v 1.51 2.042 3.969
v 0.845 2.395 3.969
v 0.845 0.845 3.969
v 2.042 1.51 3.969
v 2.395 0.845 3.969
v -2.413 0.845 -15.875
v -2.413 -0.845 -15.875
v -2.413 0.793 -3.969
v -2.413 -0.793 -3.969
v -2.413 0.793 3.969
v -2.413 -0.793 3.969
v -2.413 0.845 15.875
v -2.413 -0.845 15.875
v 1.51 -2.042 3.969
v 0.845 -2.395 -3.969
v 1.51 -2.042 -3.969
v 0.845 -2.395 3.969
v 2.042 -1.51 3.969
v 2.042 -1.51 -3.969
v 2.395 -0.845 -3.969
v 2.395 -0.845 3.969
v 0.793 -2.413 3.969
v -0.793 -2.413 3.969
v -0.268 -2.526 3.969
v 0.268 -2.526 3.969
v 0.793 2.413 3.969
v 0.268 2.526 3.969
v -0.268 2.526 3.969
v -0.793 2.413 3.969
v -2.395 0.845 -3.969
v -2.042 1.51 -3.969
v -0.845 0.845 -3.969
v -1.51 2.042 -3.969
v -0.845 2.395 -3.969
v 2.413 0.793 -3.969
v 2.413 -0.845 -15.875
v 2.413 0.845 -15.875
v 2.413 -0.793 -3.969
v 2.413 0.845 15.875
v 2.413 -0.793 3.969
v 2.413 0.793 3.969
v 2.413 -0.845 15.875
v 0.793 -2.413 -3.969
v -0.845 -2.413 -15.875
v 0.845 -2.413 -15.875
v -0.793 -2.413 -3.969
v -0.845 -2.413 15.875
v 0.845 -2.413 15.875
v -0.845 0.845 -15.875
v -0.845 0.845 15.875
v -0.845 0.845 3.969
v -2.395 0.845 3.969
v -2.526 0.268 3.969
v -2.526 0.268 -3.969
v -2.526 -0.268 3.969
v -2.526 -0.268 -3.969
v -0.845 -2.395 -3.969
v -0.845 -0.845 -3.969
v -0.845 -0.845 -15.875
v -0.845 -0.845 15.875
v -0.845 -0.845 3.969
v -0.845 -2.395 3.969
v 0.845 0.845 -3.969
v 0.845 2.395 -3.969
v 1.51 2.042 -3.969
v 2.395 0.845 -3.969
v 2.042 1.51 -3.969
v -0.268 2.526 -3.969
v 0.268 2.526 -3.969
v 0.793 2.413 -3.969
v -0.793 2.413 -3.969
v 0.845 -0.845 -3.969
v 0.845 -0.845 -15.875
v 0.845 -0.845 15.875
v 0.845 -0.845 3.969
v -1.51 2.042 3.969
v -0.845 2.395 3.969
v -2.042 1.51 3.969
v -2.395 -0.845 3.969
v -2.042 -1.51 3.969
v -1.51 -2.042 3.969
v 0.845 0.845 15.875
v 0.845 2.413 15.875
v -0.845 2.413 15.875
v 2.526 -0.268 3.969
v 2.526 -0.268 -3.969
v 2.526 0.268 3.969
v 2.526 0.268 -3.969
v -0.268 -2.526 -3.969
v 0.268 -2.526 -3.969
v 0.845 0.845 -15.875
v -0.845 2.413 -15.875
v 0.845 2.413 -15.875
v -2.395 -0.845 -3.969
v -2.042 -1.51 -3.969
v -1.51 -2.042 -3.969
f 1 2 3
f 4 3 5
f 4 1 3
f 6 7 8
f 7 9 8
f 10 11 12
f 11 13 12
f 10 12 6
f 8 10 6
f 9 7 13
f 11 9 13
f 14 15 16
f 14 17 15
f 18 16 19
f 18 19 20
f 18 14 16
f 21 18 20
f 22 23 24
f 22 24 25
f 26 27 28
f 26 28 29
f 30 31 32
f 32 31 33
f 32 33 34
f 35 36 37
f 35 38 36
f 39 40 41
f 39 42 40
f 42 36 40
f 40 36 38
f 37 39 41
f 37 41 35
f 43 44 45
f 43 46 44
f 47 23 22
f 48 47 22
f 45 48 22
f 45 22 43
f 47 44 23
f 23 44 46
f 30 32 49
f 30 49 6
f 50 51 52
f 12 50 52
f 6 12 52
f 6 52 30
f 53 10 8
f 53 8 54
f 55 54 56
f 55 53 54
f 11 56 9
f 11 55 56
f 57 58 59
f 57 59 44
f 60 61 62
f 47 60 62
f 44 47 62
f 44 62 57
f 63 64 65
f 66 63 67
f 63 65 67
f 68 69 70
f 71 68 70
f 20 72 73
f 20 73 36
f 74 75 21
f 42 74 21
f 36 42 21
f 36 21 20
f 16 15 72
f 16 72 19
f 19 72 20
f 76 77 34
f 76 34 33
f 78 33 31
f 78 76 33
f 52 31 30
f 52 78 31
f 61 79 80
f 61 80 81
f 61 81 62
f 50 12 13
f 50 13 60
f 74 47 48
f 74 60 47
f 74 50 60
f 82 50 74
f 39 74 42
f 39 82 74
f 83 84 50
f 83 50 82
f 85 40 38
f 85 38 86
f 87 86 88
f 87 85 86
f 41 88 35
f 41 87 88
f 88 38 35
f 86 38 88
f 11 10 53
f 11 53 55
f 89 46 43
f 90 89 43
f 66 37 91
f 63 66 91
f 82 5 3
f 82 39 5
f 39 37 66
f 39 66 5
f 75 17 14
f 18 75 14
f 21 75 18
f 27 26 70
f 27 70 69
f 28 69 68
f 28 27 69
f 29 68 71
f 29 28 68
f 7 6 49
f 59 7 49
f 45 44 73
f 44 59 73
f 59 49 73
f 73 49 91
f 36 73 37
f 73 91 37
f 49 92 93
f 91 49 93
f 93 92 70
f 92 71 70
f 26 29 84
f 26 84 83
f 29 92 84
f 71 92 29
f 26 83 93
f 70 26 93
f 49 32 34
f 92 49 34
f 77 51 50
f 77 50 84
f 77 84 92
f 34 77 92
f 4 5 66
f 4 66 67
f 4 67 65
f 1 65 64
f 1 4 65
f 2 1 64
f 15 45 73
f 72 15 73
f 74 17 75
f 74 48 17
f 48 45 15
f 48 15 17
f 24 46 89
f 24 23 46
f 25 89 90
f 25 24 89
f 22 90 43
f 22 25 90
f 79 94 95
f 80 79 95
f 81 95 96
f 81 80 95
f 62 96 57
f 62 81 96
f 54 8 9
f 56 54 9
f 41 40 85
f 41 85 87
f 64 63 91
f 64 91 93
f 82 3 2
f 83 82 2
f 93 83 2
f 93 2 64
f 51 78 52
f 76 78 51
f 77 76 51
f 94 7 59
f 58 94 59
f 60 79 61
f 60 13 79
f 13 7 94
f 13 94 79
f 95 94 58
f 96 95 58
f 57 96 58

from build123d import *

# Parameters (mm, degrees)
F0_W     = 1.6891
F0_H     = 1.56845
F0_H_2   = 1.6891
F0_W_2   = 1.56845
F1_DEPTH = 15.875
F2_R     = 2.54
F3_DEPTH = 3.96875


with BuildPart() as f1:
    # F0 (on Top) → F1 (new body, symmetric)
    with BuildSketch(Plane.XY):
        with Locations((0, -1.628775)):
            Rectangle(F0_W, F0_H)
        Rectangle(F0_W, F0_H_2)
        with Locations((1.628775, 0)):
            Rectangle(F0_W_2, F0_H_2)
        with Locations((-1.628775, 0)):
            Rectangle(F0_W_2, F0_H_2)
        with Locations((0, 1.628775)):
            Rectangle(F0_W, F0_H)
    extrude(amount=F1_DEPTH, both=True)

    # F2 (on Top) → F3 (join, symmetric)
    with BuildSketch(Plane.XY):
        Circle(F2_R)
    extrude(amount=F3_DEPTH, both=True)


solid = f1.part
